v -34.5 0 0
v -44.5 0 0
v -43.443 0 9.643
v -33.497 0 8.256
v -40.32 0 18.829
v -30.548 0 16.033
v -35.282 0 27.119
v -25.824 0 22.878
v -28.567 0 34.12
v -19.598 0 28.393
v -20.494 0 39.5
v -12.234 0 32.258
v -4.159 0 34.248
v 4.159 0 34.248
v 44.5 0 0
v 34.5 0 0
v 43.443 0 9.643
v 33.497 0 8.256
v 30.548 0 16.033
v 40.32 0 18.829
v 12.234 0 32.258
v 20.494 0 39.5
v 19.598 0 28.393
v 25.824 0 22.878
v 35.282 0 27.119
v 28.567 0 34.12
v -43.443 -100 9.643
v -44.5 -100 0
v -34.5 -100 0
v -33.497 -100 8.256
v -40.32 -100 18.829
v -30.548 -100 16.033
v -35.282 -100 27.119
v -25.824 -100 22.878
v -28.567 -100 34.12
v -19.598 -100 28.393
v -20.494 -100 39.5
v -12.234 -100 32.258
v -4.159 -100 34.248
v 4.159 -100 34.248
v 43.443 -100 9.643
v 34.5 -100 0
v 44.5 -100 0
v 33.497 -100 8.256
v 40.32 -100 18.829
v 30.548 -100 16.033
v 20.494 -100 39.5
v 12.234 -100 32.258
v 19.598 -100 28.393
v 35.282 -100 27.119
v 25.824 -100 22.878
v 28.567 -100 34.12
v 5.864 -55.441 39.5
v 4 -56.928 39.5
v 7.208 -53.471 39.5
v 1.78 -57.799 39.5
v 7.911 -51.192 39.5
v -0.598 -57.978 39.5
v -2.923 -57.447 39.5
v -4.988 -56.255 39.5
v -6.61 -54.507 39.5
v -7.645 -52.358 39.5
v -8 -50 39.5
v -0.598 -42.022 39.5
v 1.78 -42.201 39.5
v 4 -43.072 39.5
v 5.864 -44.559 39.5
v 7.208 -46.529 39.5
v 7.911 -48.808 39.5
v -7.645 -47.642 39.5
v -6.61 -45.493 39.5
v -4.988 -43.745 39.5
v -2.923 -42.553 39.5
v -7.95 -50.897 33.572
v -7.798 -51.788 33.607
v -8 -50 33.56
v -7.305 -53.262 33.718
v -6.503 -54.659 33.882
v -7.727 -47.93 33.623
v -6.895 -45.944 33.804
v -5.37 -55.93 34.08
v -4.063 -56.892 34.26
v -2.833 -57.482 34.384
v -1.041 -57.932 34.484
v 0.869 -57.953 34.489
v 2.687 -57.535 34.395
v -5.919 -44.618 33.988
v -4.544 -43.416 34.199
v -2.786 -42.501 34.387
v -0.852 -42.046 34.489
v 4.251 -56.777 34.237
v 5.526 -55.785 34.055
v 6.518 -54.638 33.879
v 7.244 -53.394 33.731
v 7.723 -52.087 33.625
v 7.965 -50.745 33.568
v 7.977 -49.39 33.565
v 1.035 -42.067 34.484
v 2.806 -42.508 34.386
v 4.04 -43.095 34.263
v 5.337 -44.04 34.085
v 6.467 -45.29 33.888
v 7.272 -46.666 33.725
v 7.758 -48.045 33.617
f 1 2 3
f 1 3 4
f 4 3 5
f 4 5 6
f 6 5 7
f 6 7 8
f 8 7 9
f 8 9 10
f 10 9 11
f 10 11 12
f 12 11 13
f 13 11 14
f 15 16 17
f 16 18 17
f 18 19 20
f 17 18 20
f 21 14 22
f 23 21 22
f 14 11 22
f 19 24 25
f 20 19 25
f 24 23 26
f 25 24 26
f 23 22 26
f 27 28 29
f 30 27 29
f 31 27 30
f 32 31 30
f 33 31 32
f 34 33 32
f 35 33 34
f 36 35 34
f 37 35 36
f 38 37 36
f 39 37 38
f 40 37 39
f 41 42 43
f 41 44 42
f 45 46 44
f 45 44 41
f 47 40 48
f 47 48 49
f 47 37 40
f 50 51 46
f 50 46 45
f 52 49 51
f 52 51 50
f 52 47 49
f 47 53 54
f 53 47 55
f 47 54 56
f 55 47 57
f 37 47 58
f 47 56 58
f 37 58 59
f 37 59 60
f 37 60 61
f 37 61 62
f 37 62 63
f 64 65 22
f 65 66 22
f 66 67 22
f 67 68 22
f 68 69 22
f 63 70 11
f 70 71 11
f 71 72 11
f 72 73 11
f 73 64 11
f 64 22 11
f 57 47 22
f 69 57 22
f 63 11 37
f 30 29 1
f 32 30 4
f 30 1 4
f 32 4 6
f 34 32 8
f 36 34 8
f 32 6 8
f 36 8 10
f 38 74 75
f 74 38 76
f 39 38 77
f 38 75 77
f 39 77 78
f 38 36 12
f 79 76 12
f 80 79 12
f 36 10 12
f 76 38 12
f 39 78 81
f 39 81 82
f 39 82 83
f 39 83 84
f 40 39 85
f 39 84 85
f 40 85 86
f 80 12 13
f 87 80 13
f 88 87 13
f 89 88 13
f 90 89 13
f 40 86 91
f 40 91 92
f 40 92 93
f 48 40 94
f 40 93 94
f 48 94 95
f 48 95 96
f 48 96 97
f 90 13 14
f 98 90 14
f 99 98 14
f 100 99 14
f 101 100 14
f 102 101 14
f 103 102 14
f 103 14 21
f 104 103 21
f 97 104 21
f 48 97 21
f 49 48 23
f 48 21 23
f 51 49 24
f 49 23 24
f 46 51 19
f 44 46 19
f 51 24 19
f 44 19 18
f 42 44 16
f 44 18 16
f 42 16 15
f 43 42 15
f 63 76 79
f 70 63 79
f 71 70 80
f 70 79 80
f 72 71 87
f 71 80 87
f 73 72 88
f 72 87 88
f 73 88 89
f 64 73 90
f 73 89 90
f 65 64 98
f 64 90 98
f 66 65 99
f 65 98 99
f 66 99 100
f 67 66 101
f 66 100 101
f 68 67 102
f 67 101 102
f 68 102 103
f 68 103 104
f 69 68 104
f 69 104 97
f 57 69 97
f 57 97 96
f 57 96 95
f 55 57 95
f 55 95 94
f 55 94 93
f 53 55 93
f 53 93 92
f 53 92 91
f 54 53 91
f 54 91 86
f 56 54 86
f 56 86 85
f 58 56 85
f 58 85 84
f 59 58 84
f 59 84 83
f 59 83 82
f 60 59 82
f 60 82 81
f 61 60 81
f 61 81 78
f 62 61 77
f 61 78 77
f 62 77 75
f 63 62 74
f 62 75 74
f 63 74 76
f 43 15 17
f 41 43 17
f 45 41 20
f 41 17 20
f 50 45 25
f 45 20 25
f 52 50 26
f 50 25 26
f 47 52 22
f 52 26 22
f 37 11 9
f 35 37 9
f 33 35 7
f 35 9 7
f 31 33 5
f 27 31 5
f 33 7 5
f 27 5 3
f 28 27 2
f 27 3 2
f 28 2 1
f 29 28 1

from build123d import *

# Parameters (mm, degrees)
F1_DEPTH = 100
F3_D     = 16


with BuildPart() as f1:
    # F0 (on Front) → F1 (new body)
    with BuildSketch(Plane.XZ):
        with BuildLine():
            Line((34.5, 0), (44.5, 0))
            ThreePointArc((44.5, 0), (38.02781, 23.111376), (20.493902, 39.5))
            Line((20.493902, 39.5), (-20.493902, 39.5))
            ThreePointArc((-20.493902, 39.5), (-38.02781, 23.111376), (-44.5, 0))
            Line((-44.5, 0), (-34.5, 0))
            ThreePointArc((-34.5, 0), (0, 34.5), (34.5, 0))
        make_face()
    extrude(amount=F1_DEPTH)

    # F3 (through all)
    with Locations(Plane.XY.offset(39.5)):
        with Locations((0, -50)):
            Hole(F3_D / 2)


solid = f1.part
